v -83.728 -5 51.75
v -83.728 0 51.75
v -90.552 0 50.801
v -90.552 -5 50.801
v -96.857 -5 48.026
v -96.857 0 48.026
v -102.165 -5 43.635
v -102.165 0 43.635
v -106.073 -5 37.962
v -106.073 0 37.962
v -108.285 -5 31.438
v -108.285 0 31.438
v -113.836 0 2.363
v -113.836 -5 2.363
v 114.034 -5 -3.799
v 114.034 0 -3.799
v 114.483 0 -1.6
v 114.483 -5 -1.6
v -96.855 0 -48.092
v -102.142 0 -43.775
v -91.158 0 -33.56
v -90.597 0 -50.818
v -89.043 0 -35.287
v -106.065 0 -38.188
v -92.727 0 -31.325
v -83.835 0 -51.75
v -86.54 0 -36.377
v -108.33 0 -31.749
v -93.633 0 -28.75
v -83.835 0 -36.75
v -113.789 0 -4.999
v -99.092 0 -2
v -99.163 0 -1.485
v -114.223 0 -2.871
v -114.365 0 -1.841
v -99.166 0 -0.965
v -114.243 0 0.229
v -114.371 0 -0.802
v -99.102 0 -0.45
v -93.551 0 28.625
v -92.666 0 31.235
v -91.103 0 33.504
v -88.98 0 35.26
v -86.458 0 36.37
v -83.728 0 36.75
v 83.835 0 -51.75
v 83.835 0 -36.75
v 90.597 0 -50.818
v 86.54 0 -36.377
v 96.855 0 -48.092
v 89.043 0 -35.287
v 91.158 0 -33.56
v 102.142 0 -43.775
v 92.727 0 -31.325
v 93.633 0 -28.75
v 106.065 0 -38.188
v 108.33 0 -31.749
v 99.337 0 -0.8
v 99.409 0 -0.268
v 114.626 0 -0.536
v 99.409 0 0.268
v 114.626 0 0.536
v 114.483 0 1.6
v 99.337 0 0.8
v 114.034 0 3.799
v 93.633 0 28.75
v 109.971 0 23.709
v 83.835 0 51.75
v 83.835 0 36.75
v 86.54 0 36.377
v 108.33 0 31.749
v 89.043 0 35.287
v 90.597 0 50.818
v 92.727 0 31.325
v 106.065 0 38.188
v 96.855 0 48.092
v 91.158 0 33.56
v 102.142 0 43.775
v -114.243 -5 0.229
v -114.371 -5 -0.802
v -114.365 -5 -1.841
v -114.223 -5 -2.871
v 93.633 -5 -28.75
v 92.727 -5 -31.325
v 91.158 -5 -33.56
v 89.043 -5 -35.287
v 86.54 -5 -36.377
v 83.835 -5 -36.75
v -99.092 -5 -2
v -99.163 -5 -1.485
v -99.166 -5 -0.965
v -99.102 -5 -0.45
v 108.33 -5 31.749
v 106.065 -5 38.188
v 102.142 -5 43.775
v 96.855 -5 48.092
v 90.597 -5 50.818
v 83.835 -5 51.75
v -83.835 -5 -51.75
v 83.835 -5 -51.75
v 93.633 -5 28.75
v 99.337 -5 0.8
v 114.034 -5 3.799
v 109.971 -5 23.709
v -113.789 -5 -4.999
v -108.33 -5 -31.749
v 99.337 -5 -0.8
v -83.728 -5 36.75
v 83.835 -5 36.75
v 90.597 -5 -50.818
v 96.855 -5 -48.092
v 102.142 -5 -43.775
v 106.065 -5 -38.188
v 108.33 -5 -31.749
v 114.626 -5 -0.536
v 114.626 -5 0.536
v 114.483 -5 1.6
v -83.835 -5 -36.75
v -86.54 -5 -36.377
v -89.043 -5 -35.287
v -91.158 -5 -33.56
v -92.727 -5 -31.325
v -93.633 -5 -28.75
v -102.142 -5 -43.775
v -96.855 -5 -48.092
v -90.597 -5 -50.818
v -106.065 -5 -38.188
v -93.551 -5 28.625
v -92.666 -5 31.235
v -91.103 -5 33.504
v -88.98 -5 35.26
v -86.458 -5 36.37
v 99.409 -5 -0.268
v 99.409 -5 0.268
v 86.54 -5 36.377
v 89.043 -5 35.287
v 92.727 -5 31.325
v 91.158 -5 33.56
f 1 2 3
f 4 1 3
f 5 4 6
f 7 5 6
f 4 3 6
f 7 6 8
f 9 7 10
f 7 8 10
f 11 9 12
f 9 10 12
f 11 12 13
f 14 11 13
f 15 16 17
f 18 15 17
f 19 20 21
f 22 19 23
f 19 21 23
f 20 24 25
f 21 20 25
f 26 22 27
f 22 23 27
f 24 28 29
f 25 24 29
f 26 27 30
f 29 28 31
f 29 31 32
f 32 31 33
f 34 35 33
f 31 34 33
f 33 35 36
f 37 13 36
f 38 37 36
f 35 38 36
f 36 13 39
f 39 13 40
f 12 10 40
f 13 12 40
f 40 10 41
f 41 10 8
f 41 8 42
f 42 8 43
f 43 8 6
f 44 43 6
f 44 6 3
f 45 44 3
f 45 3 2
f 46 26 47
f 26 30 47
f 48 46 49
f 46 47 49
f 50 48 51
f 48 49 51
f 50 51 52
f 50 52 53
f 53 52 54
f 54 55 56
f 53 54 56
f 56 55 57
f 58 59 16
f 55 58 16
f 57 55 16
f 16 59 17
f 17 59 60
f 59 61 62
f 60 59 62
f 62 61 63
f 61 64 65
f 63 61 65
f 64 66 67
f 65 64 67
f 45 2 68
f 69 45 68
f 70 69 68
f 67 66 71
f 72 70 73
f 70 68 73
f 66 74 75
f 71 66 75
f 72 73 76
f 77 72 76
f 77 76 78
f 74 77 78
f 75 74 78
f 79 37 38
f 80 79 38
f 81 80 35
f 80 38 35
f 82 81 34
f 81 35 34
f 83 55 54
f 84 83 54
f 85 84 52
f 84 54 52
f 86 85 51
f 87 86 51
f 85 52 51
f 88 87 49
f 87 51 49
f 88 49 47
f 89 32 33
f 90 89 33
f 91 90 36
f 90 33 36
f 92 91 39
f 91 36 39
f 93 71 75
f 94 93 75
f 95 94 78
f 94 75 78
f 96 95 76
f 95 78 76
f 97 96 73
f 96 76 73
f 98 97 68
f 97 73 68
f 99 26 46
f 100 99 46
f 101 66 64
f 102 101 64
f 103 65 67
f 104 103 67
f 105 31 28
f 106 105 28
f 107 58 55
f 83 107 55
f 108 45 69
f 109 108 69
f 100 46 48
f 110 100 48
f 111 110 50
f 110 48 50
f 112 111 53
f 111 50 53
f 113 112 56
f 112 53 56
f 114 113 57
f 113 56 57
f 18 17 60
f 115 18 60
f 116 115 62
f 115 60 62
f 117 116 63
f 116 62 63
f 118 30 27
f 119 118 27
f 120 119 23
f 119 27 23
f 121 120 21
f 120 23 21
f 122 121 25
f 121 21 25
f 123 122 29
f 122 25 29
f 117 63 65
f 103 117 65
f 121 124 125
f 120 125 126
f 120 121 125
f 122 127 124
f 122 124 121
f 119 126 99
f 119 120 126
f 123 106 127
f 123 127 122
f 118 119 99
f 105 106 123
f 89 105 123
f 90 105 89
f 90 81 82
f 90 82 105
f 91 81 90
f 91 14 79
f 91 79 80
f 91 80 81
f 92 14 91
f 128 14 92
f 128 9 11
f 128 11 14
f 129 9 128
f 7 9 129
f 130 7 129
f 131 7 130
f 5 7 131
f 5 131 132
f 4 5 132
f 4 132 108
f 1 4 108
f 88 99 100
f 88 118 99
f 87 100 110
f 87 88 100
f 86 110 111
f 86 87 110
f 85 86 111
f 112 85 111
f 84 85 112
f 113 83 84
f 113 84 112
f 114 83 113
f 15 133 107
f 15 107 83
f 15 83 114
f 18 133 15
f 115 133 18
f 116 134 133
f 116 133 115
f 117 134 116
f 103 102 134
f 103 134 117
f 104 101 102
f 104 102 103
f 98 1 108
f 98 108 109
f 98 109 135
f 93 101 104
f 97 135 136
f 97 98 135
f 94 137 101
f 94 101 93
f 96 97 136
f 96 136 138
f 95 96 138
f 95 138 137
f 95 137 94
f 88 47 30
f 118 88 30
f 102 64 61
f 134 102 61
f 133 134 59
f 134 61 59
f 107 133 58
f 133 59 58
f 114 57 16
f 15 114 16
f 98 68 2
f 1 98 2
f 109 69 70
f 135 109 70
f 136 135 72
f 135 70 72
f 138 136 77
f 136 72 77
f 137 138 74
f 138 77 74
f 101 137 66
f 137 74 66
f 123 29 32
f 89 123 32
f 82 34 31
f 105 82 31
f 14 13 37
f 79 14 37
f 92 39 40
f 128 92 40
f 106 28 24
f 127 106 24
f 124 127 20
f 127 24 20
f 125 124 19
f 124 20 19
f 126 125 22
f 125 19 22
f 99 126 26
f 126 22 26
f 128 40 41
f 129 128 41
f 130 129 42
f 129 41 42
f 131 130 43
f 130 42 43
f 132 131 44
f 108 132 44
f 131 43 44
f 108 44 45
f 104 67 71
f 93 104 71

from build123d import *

# Parameters (mm, degrees)
F1_DEPTH = 5


with BuildPart() as f1:
    # F0 (on Front) → F1 (new body)
    with BuildSketch(Plane.XZ):
        with BuildLine():
            ThreePointArc((108.329796, 31.749), (99.646478, 46.114594), (83.834694, 51.75))
            Line((83.834694, 51.75), (-83.728488, 51.75))
            ThreePointArc((-83.728488, 51.75), (-99.662707, 46.013973), (-108.284997, 31.438053))
            Line((-108.284997, 31.438053), (-113.835649, 2.36316))
            Line((-113.835649, 2.36316), (-114.243014, 0.229341))
            ThreePointArc((-114.243014, 0.229341), (-114.38477, -1.321549), (-114.223364, -2.870517))
            Line((-114.223364, -2.870517), (-113.788979, -4.999))
            Line((-113.788979, -4.999), (-108.329796, -31.749))
            ThreePointArc((-108.329796, -31.749), (-99.646478, -46.114594), (-83.834694, -51.75))
            Line((-83.834694, -51.75), (83.834694, -51.75))
            ThreePointArc((83.834694, -51.75), (99.646478, -46.114594), (108.329796, -31.749))
            Line((108.329796, -31.749), (114.033828, -3.79924))
            Line((114.033828, -3.79924), (114.482718, -1.59968))
            ThreePointArc((114.482718, -1.59968), (114.644286, 0), (114.482718, 1.59968))
            Line((114.482718, 1.59968), (114.033828, 3.79924))
            Line((114.033828, 3.79924), (109.970639, 23.708868))
            Line((109.970639, 23.708868), (108.329796, 31.749))
        make_face()
        with BuildLine():
            Line((-83.728488, 36.75), (83.834694, 36.75))
            ThreePointArc((83.834694, 36.75), (90.159407, 34.495838), (93.632735, 28.7496))
            Line((93.632735, 28.7496), (99.336767, 0.79984))
            ThreePointArc((99.336767, 0.79984), (99.417551, 0), (99.336767, -0.79984))
            Line((99.336767, -0.79984), (93.632735, -28.7496))
            ThreePointArc((93.632735, -28.7496), (90.159407, -34.495838), (83.834694, -36.75))
            Line((83.834694, -36.75), (-83.834694, -36.75))
            ThreePointArc((-83.834694, -36.75), (-90.159407, -34.495838), (-93.632735, -28.7496))
            Line((-93.632735, -28.7496), (-99.091918, -1.9996))
            ThreePointArc((-99.091918, -1.9996), (-99.172622, -1.225116), (-99.101744, -0.449672))
            Line((-99.101744, -0.449672), (-93.551092, 28.625221))
            ThreePointArc((-93.551092, 28.625221), (-90.102175, 34.455589), (-83.728488, 36.75))
        make_face(mode=Mode.SUBTRACT)
    extrude(amount=F1_DEPTH)


solid = f1.part
